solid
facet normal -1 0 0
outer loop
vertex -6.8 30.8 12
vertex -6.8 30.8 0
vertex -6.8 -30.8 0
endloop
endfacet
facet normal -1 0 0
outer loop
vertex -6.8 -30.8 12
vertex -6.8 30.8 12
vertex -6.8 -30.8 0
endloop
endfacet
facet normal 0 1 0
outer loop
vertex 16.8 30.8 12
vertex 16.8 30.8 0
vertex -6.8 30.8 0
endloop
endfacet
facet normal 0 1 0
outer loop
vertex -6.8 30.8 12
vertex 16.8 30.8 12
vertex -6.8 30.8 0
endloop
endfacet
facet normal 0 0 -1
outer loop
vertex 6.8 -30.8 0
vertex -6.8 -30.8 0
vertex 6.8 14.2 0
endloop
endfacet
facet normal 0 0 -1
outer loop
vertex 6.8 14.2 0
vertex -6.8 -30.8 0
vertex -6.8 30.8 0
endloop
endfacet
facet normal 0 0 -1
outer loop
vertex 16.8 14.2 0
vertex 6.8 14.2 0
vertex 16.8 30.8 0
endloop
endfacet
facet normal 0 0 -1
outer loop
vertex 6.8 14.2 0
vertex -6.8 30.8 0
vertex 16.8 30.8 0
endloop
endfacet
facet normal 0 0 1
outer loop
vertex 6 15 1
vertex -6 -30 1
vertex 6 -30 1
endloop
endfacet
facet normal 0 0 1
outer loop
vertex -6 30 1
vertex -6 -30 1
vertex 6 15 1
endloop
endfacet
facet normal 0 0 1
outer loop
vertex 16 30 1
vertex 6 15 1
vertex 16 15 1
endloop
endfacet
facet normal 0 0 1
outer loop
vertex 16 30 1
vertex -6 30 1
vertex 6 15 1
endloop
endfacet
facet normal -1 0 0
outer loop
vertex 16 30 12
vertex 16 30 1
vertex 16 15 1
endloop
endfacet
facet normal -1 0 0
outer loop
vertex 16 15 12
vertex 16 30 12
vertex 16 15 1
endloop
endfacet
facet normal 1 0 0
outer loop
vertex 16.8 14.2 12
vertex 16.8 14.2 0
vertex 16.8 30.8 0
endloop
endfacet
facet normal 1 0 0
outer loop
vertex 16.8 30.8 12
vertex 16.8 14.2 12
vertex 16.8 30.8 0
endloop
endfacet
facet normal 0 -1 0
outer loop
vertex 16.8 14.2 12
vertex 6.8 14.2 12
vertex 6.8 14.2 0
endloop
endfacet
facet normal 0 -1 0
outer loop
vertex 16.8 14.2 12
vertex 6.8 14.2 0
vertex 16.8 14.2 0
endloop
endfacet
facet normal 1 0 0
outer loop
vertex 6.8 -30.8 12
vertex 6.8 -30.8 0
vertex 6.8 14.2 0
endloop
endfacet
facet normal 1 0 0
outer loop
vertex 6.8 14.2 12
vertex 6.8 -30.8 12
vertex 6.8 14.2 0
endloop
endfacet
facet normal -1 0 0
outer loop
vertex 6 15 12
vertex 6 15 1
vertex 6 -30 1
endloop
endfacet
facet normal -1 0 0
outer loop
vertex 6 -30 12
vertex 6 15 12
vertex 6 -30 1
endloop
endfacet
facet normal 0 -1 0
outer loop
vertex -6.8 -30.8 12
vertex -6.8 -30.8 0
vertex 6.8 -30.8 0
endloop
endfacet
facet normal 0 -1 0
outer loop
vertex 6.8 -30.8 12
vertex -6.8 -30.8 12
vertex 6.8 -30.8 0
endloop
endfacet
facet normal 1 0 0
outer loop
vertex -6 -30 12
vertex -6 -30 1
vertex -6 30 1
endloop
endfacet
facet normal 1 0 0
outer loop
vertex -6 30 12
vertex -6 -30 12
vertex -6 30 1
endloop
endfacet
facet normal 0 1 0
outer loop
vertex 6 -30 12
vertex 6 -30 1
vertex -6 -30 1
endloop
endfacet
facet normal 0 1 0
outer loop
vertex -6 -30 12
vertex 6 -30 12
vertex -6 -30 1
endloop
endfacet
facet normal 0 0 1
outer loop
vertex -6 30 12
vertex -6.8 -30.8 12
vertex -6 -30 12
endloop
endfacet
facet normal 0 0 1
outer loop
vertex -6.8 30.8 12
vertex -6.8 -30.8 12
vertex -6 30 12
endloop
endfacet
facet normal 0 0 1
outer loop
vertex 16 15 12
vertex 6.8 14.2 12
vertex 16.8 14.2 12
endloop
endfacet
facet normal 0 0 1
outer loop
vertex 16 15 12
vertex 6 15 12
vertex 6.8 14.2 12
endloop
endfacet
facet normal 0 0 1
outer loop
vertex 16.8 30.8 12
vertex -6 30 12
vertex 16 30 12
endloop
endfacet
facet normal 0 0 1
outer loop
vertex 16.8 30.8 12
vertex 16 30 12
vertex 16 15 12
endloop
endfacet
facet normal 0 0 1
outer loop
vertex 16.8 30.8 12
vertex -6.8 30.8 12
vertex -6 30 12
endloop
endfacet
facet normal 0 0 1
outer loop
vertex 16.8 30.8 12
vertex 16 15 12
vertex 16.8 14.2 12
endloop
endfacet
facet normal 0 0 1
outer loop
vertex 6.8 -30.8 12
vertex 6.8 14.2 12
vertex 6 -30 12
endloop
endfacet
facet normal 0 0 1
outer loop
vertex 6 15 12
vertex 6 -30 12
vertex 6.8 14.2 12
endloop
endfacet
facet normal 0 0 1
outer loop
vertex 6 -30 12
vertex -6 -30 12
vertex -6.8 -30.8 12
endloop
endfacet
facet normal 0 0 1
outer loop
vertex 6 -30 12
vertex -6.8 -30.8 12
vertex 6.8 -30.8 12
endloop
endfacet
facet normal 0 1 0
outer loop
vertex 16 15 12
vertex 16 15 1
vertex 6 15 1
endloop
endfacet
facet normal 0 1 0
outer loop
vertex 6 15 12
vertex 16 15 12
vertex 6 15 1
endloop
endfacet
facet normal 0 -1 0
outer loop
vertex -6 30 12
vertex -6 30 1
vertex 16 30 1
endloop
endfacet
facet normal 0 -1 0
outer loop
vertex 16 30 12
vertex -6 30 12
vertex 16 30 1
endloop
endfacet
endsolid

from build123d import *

# Parameters (mm, degrees)
F1_DEPTH = 12
F2_DEPTH = 1


with BuildPart() as f1:
    # F0 (on Top) → F1 (new body)
    with BuildSketch(Plane.XY):
        Polygon((-6.8, -30.8), (6.8, -30.8), (6.8, 14.2), (16.8, 14.2), (16.8, 30.8), (6.8, 30.8), (-6.8, 30.8), align=None)
        Polygon((6, -30), (-6, -30), (-6, 30), (6, 30), (16, 30), (16, 15), (6, 15), align=None, mode=Mode.SUBTRACT)
    extrude(amount=F1_DEPTH)

    # F0 (on Top) → F2 (join)
    with BuildSketch(Plane.XY):
        Polygon((-6, 30), (-6, -30), (6, -30), (6, 15), (16, 15), (16, 30), (6, 30), align=None)
    extrude(amount=F2_DEPTH)


solid = f1.part
